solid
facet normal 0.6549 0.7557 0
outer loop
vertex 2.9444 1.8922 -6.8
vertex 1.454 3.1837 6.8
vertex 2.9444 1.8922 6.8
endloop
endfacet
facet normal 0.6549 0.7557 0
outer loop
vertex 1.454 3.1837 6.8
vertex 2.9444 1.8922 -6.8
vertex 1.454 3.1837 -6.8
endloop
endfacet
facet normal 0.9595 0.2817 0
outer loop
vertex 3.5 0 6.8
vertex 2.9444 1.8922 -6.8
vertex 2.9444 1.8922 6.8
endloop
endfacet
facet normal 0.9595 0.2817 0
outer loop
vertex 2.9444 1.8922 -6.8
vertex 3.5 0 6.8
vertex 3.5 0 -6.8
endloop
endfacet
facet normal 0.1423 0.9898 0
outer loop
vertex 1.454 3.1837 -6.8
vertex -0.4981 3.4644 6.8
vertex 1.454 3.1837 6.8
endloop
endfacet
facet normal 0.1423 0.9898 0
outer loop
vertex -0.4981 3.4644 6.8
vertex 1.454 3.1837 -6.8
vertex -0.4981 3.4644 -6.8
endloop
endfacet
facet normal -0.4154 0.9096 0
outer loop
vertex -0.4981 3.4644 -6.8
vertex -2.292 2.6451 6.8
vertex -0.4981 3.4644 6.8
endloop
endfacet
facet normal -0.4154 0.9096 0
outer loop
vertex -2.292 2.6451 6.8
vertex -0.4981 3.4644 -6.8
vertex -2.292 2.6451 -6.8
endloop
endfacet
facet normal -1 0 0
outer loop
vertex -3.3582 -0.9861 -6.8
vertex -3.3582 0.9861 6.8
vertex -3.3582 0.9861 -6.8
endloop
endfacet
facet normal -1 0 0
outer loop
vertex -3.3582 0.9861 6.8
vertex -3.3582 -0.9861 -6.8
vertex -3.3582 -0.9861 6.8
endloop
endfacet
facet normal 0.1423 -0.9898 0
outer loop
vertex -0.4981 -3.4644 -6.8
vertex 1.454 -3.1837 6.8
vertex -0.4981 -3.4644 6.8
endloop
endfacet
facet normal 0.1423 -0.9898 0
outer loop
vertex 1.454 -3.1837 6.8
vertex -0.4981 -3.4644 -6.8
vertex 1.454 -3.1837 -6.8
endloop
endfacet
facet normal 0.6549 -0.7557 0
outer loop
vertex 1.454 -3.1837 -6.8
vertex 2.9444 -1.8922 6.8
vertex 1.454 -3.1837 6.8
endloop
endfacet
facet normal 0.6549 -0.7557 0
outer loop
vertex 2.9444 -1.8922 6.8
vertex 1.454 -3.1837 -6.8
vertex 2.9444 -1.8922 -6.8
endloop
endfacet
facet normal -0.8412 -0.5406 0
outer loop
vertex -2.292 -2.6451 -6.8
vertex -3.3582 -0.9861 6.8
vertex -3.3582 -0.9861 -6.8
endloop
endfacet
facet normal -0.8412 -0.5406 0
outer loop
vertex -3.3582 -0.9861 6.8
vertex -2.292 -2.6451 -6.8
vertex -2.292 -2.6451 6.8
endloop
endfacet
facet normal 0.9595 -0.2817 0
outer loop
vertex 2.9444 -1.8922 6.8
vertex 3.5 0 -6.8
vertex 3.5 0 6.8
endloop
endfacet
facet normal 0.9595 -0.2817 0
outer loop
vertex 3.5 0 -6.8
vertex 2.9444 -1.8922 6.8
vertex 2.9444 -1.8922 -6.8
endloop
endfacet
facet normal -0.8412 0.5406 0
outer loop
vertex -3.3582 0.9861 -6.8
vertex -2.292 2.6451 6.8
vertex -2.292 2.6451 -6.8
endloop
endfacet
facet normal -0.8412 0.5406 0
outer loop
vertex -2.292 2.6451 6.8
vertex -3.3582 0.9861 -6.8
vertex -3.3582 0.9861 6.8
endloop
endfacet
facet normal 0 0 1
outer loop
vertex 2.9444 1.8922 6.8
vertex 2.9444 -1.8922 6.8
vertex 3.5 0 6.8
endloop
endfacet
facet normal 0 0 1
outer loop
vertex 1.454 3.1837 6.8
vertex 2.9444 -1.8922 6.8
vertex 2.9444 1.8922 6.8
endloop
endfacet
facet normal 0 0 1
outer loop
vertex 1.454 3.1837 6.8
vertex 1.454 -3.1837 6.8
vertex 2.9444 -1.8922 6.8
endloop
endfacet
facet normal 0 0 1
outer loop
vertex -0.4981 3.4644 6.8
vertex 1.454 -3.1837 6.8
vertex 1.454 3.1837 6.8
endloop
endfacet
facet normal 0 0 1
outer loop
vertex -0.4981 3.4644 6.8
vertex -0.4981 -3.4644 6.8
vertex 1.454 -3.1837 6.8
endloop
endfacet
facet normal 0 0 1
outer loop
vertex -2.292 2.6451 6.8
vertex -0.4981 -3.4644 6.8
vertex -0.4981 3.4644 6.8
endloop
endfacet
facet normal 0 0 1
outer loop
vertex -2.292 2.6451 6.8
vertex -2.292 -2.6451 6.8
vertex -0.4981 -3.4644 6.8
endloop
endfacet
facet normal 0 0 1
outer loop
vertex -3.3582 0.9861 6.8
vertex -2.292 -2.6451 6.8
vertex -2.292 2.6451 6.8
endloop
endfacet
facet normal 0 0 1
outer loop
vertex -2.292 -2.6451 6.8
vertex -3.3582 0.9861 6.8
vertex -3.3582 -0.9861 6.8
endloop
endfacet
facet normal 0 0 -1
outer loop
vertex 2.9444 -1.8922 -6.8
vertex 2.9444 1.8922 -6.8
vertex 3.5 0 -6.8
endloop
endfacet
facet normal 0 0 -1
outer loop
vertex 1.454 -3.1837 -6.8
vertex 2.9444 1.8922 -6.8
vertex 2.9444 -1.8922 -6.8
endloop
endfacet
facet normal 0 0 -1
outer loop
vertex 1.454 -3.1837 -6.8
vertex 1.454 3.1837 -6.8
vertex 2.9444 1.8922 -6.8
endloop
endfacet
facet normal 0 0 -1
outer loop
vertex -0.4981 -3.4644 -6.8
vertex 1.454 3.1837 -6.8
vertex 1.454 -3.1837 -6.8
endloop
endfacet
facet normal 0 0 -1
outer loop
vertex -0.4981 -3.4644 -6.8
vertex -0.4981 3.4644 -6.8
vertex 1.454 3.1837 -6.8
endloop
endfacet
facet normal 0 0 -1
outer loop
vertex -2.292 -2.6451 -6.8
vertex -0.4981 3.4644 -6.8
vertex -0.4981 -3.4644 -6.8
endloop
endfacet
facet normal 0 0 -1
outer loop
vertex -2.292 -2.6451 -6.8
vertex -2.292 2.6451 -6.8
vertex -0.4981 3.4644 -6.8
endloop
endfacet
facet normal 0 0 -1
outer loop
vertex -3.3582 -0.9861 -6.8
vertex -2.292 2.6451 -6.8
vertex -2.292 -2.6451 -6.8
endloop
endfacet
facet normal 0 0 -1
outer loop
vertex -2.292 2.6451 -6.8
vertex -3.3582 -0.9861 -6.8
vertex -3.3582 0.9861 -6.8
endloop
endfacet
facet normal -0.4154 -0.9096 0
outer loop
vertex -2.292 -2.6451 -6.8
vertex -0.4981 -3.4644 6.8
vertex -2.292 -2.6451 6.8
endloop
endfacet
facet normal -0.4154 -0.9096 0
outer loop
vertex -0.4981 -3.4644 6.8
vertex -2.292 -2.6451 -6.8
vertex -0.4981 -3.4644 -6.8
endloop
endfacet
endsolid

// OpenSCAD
// Parameters
body_diameter_mm = 7; //[3.5:14:0.1]
overall_height_mm = 13.6; //[6.8:27.2:0.1]
centered = 1; //[0:1:1]
include_lever = 0; //[0:1:1]
include_threads = 0; //[0:1:1]
include_nut_washer = 0; //[0:1:1]
include_pins = 0; //[0:1:1]
face_thickness_mm = 0.6; //[0.3:1.2:0.1]
face_diameter_scale = 0.96; //[0.85:1:0.01]
overlap_mm = 0.8; //[0.5:2:0.1]
lever_diameter_mm = 2.5; //[1.5:5:0.1]
lever_height_mm = 6; //[3:12:0.1]

// Toggle switch body
module switch_body() {
  color("DimGray") {
    // Main body cylinder
    cylinder(h=overall_height_mm, r=body_diameter_mm/2, center=true);
    
    // Top face
    translate([0, 0, overall_height_mm/2 - face_thickness_mm/2 - overlap_mm/2])
      cylinder(h=face_thickness_mm, r=(body_diameter_mm*face_diameter_scale)/2, center=true);
    
    // Bottom face
    translate([0, 0, -overall_height_mm/2 + face_thickness_mm/2 + overlap_mm/2])
      cylinder(h=face_thickness_mm, r=(body_diameter_mm*face_diameter_scale)/2, center=true);
  }
}

// Toggle lever
module toggle() {
  if (include_lever) {
    color("Silver") {
      translate([0, 0, overall_height_mm/2 + (lever_height_mm*include_lever)/2 - overlap_mm])
        cylinder(h=lever_height_mm*include_lever, r=(lever_diameter_mm/2)*include_lever, center=true);
    }
  }
}

// Assembly
module assembly() {
  switch_body();
  toggle();
}

assembly();
